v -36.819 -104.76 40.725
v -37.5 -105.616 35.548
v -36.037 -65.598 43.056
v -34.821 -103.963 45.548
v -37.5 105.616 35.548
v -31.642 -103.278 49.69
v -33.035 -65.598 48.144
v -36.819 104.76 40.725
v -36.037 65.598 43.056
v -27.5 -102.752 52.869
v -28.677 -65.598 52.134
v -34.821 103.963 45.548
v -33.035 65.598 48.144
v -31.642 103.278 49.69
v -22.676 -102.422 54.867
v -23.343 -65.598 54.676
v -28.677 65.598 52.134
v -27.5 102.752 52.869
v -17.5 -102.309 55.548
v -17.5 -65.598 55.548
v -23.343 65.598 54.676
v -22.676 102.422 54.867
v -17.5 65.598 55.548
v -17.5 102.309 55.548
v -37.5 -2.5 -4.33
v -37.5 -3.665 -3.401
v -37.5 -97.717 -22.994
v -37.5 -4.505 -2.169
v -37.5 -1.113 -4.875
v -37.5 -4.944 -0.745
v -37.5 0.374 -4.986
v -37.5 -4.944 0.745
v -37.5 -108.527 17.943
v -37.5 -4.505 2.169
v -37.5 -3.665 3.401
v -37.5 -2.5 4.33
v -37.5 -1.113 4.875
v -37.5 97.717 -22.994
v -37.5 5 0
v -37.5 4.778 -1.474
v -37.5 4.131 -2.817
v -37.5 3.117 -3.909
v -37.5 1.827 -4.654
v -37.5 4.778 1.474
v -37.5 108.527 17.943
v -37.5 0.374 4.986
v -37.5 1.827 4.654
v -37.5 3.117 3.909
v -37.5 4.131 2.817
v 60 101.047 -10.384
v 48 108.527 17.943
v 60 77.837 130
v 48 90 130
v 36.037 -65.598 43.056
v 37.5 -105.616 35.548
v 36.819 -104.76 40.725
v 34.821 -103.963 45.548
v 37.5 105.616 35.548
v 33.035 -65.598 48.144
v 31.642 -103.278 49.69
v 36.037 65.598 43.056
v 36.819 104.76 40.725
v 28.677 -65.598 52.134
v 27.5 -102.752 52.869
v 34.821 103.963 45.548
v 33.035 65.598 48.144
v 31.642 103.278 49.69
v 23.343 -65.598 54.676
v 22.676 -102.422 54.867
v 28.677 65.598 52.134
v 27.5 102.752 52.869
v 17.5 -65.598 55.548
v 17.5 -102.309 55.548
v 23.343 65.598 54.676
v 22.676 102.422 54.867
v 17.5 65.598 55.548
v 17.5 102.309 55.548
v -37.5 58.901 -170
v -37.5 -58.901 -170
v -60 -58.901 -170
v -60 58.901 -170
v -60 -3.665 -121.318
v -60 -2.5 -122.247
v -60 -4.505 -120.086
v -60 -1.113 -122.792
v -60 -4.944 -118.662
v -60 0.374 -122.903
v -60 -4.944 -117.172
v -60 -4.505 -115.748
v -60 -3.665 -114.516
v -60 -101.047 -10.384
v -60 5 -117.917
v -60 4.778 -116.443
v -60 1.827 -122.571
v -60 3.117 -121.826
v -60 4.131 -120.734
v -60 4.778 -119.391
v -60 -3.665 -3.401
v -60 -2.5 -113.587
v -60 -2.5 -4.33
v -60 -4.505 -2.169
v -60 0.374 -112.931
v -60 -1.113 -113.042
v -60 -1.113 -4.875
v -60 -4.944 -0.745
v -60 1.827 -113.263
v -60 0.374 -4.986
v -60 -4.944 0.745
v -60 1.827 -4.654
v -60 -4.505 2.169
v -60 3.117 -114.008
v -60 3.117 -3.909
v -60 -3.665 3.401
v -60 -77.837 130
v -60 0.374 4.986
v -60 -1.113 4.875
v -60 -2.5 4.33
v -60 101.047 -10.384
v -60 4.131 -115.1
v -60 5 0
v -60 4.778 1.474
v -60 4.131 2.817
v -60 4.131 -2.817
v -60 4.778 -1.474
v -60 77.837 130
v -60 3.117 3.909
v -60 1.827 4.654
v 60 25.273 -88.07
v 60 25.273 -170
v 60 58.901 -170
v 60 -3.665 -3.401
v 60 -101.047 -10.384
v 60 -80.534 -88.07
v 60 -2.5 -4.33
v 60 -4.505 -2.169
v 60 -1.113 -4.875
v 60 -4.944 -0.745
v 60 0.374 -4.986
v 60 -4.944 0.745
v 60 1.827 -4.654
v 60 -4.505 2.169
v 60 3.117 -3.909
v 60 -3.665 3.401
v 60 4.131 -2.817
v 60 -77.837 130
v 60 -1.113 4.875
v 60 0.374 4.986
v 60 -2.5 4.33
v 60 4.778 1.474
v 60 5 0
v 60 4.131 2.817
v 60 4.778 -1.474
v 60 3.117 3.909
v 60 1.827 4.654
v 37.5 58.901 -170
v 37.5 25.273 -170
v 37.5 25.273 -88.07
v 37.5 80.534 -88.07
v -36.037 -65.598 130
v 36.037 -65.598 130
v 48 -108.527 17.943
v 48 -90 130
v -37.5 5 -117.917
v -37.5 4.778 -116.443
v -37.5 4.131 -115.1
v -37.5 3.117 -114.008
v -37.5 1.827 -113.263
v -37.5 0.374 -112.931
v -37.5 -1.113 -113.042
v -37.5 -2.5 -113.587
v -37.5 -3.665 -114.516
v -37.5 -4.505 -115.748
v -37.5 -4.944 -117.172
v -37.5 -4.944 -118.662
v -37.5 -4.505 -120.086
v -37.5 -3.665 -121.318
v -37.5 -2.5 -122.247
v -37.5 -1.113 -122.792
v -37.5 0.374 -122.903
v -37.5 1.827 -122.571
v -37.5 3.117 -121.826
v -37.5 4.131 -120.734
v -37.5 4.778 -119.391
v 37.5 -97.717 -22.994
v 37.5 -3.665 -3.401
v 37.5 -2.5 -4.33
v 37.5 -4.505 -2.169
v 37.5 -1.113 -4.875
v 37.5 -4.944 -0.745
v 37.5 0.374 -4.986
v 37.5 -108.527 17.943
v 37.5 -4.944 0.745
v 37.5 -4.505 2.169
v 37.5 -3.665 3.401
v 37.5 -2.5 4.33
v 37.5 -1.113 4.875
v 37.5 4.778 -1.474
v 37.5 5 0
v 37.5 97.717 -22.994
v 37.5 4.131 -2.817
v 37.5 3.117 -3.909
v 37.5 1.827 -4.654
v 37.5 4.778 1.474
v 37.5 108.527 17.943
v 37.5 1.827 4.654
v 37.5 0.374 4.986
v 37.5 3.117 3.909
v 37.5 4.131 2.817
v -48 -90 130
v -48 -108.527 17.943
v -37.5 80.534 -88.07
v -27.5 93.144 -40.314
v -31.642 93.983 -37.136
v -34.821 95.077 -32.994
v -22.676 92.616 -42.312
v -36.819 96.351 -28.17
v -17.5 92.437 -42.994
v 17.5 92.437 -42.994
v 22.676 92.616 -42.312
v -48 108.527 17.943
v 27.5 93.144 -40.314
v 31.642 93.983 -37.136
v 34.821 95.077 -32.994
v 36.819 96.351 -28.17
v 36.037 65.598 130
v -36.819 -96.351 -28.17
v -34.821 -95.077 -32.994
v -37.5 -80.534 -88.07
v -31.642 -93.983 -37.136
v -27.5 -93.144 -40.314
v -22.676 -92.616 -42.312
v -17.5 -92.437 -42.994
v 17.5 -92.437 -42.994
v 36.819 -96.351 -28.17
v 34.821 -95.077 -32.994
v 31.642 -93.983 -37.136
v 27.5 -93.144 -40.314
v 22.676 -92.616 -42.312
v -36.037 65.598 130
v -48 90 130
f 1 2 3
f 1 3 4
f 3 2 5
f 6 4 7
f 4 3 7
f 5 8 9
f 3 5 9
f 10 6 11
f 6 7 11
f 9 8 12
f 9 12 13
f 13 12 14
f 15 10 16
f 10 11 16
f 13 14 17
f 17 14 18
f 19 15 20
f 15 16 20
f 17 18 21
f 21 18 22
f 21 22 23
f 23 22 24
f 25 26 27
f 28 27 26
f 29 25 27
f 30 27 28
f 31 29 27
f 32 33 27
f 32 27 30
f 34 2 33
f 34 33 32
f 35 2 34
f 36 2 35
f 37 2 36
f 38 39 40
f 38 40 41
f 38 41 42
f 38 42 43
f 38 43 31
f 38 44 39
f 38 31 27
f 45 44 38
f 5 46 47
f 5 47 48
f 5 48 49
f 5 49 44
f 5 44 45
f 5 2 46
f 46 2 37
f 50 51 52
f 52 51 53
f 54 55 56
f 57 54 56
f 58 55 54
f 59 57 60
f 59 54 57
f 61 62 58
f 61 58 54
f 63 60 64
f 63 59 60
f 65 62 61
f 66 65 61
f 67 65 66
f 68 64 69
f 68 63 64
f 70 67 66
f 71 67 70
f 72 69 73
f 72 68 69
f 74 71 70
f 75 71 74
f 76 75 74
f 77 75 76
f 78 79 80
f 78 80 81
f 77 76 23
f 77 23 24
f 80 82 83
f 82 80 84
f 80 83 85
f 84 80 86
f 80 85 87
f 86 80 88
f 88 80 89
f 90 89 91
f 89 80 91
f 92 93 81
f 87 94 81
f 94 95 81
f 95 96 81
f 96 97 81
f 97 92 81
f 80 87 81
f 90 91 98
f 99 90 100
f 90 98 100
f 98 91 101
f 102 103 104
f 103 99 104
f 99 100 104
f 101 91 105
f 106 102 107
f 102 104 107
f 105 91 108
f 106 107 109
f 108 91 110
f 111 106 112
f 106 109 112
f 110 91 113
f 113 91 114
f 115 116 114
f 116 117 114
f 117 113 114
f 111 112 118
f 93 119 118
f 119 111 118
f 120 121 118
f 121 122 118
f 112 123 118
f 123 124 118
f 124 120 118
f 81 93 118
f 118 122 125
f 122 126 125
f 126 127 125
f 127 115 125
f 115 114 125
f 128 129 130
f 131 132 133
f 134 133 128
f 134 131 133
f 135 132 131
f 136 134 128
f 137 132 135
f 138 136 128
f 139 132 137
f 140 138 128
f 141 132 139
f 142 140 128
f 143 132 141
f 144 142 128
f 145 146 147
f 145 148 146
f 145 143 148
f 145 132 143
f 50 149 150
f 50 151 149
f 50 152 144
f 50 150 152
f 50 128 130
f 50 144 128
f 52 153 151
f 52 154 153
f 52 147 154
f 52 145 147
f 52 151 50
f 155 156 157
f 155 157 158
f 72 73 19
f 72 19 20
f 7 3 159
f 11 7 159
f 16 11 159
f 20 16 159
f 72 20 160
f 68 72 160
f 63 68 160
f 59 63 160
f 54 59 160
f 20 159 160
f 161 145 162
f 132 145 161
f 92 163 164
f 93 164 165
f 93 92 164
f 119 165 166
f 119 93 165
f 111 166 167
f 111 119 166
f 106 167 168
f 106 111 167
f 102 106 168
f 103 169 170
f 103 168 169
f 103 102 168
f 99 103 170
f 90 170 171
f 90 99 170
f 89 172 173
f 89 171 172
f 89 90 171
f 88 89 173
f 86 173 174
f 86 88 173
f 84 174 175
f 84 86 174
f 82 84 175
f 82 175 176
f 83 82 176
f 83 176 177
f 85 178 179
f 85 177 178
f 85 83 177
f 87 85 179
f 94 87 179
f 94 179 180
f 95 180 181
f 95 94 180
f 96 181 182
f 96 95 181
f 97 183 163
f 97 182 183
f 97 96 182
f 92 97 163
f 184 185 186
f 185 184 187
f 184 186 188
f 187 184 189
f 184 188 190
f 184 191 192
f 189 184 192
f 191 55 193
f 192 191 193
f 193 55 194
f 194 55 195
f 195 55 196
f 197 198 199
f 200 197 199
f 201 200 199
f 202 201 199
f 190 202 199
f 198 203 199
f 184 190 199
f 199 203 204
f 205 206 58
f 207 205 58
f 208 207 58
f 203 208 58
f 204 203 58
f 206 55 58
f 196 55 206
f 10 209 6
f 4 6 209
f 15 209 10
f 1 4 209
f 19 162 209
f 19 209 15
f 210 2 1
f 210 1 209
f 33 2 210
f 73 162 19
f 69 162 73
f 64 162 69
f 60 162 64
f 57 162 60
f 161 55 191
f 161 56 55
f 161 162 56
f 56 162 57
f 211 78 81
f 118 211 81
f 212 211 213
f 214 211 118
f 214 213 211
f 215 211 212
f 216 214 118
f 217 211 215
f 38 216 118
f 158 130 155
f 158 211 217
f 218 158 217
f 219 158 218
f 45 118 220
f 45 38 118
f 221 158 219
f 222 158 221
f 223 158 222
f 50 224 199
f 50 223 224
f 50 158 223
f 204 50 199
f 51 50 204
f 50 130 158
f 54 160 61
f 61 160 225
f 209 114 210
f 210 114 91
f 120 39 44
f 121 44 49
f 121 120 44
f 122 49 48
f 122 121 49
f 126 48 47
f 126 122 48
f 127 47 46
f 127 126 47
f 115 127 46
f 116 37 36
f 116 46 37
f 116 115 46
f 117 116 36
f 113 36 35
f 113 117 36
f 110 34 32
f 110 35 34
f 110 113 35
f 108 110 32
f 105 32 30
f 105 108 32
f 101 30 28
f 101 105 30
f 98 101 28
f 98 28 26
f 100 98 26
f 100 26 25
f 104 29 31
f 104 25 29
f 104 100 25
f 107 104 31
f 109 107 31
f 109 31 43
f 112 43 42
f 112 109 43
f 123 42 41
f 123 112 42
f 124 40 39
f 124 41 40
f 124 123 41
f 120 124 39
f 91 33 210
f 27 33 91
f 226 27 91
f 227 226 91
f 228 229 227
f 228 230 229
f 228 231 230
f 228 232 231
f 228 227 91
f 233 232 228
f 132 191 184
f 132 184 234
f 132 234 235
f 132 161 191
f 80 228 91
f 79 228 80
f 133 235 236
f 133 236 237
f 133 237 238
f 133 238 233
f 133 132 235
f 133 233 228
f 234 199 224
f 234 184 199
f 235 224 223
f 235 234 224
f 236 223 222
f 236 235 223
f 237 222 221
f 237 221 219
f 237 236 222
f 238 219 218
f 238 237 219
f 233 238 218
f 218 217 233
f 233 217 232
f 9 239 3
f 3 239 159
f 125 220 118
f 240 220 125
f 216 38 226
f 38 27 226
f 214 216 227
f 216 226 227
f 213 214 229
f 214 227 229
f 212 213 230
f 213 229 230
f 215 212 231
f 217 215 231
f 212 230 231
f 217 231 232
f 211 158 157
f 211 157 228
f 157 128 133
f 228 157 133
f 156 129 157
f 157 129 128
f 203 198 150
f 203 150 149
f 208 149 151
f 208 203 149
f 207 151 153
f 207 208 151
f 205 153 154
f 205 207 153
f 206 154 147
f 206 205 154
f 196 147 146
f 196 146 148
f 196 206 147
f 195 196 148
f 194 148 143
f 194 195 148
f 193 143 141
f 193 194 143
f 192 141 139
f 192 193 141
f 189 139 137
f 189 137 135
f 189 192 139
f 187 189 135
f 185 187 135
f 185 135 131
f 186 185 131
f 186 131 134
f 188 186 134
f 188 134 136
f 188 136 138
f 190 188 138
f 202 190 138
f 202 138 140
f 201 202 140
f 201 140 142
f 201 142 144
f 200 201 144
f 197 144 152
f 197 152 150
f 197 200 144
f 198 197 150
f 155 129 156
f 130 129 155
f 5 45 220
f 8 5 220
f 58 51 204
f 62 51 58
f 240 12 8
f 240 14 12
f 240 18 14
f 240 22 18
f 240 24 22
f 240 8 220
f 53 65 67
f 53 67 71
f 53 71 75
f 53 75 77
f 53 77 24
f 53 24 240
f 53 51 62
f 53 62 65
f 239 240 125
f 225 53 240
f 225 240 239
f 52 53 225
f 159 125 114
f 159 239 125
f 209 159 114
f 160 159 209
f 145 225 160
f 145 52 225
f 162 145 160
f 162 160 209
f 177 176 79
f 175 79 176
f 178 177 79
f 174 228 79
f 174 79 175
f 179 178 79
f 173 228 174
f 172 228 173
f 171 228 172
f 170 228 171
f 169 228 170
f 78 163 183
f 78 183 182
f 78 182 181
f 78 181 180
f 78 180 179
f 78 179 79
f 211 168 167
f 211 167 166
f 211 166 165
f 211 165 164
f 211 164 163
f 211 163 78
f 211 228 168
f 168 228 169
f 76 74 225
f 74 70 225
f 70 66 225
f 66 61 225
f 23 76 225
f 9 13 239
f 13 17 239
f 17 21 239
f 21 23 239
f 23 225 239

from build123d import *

# Parameters (mm, degrees)
F0_R      = 5
F1_DEPTH  = 60
F3_W      = 309.3655258417
F3_H      = 284.4564542174
F4_DEPTH  = 37.5
F5_SIZE   = 12
F7_DEPTH  = 75
F9_R      = 20
F11_DEPTH = 86.9450472691
F8_R      = 5
F7_FACE_R = 5
F12_DEPTH = 22.5


# Not quite as in the source:
# - a feature names something its author has since deleted; it is built from what else it names


with BuildPart() as f1:
    # F0 (on Right) → F1 (new body, symmetric)
    with BuildSketch(Plane.YZ):
        Polygon((75, 130), (-75, 130), (-90, 130), (-108.526711476, 17.9430459013), (-58.9007476441, -170), (58.9007476441, -170), (108.526711476, 17.9430459013), (90, 130), align=None)
        with Locations((0, -117.917008698)):
            Circle(F0_R, mode=Mode.SUBTRACT)
        Circle(F0_R, mode=Mode.SUBTRACT)
    extrude(amount=F1_DEPTH, both=True)

    # F3 (on face) → F4 (cut, symmetric)
    with BuildSketch(Plane.YZ):
        with Locations((9.2283859849, -86.6799689829)):
            Rectangle(F3_W, F3_H)
    extrude(amount=F4_DEPTH, both=True, mode=Mode.SUBTRACT)

    # F5
    f5_edges = [f1.edges().sort_by_distance(p)[0] for p in [
        (-60, -99.263356, 73.971523),
        (-60, 99.263356, 73.971523),
        (60, -99.263356, 73.971523),
        (60, 99.263356, 73.971523),
    ]]
    chamfer(f5_edges, length=F5_SIZE)

    # F6 (on face) → F7 (join, through all)
    with BuildSketch(Plane.YZ.offset(-37.5)):
        Polygon((92.4365120253, -42.9936263649), (-92.4365120253, -42.9936263649), (-80.5341079321, -88.0703141729), (80.5341079321, -88.0703141729), align=None)
    extrude(amount=F7_DEPTH)

    # F9
    f9_edges = [f1.edges().sort_by_distance(p)[0] for p in [
        (-37.5, 0, 55.548258),
        (37.5, 0, 55.548258),
        (-37.5, 0, -42.993626),
        (37.5, 0, -42.993626),
    ]]
    fillet(f9_edges, radius=F9_R)

    # F10 (on face) → F11 (cut, through all)
    with BuildSketch(Plane.XY.offset(130)):
        Polygon((36.0373817384, 65.5976682901), (0, 65.5976682901), (-36.0373817384, 65.5976682901), (-36.0373817384, 0), (-36.0373817384, -65.5976682901), (0, -65.5976682901), (36.0373817384, -65.5976682901), (36.0373817384, 0), align=None)
    extrude(amount=-F11_DEPTH, mode=Mode.SUBTRACT)

    # F8 (on face) + F7_face (on face) → F12 (cut, through all)
    with BuildSketch(Plane.YZ.offset(60)):
        Polygon((25.2734031528, -88.0703141729), (-80.5341079321, -88.0703141729), (-58.9007476441, -170), (25.2734031528, -170), align=None)
        with Locations((0, -117.917008698)):
            Circle(F8_R, mode=Mode.SUBTRACT)
    with BuildSketch(Plane(origin=(37.5, 0, -126.978888881), x_dir=(0, -1, 0), z_dir=(-1, 0, 0))):
        Polygon((-80.5341079321, 38.9085747081), (-58.9007476441, -43.021111119), (58.9007476441, -43.021111119), (80.5341079321, 38.9085747081), align=None)
        with Locations((0, 9.061880183)):
            Circle(F7_FACE_R, mode=Mode.SUBTRACT)
    extrude(amount=-F12_DEPTH, dir=(1, 0, 0), mode=Mode.SUBTRACT)


solid = f1.part
